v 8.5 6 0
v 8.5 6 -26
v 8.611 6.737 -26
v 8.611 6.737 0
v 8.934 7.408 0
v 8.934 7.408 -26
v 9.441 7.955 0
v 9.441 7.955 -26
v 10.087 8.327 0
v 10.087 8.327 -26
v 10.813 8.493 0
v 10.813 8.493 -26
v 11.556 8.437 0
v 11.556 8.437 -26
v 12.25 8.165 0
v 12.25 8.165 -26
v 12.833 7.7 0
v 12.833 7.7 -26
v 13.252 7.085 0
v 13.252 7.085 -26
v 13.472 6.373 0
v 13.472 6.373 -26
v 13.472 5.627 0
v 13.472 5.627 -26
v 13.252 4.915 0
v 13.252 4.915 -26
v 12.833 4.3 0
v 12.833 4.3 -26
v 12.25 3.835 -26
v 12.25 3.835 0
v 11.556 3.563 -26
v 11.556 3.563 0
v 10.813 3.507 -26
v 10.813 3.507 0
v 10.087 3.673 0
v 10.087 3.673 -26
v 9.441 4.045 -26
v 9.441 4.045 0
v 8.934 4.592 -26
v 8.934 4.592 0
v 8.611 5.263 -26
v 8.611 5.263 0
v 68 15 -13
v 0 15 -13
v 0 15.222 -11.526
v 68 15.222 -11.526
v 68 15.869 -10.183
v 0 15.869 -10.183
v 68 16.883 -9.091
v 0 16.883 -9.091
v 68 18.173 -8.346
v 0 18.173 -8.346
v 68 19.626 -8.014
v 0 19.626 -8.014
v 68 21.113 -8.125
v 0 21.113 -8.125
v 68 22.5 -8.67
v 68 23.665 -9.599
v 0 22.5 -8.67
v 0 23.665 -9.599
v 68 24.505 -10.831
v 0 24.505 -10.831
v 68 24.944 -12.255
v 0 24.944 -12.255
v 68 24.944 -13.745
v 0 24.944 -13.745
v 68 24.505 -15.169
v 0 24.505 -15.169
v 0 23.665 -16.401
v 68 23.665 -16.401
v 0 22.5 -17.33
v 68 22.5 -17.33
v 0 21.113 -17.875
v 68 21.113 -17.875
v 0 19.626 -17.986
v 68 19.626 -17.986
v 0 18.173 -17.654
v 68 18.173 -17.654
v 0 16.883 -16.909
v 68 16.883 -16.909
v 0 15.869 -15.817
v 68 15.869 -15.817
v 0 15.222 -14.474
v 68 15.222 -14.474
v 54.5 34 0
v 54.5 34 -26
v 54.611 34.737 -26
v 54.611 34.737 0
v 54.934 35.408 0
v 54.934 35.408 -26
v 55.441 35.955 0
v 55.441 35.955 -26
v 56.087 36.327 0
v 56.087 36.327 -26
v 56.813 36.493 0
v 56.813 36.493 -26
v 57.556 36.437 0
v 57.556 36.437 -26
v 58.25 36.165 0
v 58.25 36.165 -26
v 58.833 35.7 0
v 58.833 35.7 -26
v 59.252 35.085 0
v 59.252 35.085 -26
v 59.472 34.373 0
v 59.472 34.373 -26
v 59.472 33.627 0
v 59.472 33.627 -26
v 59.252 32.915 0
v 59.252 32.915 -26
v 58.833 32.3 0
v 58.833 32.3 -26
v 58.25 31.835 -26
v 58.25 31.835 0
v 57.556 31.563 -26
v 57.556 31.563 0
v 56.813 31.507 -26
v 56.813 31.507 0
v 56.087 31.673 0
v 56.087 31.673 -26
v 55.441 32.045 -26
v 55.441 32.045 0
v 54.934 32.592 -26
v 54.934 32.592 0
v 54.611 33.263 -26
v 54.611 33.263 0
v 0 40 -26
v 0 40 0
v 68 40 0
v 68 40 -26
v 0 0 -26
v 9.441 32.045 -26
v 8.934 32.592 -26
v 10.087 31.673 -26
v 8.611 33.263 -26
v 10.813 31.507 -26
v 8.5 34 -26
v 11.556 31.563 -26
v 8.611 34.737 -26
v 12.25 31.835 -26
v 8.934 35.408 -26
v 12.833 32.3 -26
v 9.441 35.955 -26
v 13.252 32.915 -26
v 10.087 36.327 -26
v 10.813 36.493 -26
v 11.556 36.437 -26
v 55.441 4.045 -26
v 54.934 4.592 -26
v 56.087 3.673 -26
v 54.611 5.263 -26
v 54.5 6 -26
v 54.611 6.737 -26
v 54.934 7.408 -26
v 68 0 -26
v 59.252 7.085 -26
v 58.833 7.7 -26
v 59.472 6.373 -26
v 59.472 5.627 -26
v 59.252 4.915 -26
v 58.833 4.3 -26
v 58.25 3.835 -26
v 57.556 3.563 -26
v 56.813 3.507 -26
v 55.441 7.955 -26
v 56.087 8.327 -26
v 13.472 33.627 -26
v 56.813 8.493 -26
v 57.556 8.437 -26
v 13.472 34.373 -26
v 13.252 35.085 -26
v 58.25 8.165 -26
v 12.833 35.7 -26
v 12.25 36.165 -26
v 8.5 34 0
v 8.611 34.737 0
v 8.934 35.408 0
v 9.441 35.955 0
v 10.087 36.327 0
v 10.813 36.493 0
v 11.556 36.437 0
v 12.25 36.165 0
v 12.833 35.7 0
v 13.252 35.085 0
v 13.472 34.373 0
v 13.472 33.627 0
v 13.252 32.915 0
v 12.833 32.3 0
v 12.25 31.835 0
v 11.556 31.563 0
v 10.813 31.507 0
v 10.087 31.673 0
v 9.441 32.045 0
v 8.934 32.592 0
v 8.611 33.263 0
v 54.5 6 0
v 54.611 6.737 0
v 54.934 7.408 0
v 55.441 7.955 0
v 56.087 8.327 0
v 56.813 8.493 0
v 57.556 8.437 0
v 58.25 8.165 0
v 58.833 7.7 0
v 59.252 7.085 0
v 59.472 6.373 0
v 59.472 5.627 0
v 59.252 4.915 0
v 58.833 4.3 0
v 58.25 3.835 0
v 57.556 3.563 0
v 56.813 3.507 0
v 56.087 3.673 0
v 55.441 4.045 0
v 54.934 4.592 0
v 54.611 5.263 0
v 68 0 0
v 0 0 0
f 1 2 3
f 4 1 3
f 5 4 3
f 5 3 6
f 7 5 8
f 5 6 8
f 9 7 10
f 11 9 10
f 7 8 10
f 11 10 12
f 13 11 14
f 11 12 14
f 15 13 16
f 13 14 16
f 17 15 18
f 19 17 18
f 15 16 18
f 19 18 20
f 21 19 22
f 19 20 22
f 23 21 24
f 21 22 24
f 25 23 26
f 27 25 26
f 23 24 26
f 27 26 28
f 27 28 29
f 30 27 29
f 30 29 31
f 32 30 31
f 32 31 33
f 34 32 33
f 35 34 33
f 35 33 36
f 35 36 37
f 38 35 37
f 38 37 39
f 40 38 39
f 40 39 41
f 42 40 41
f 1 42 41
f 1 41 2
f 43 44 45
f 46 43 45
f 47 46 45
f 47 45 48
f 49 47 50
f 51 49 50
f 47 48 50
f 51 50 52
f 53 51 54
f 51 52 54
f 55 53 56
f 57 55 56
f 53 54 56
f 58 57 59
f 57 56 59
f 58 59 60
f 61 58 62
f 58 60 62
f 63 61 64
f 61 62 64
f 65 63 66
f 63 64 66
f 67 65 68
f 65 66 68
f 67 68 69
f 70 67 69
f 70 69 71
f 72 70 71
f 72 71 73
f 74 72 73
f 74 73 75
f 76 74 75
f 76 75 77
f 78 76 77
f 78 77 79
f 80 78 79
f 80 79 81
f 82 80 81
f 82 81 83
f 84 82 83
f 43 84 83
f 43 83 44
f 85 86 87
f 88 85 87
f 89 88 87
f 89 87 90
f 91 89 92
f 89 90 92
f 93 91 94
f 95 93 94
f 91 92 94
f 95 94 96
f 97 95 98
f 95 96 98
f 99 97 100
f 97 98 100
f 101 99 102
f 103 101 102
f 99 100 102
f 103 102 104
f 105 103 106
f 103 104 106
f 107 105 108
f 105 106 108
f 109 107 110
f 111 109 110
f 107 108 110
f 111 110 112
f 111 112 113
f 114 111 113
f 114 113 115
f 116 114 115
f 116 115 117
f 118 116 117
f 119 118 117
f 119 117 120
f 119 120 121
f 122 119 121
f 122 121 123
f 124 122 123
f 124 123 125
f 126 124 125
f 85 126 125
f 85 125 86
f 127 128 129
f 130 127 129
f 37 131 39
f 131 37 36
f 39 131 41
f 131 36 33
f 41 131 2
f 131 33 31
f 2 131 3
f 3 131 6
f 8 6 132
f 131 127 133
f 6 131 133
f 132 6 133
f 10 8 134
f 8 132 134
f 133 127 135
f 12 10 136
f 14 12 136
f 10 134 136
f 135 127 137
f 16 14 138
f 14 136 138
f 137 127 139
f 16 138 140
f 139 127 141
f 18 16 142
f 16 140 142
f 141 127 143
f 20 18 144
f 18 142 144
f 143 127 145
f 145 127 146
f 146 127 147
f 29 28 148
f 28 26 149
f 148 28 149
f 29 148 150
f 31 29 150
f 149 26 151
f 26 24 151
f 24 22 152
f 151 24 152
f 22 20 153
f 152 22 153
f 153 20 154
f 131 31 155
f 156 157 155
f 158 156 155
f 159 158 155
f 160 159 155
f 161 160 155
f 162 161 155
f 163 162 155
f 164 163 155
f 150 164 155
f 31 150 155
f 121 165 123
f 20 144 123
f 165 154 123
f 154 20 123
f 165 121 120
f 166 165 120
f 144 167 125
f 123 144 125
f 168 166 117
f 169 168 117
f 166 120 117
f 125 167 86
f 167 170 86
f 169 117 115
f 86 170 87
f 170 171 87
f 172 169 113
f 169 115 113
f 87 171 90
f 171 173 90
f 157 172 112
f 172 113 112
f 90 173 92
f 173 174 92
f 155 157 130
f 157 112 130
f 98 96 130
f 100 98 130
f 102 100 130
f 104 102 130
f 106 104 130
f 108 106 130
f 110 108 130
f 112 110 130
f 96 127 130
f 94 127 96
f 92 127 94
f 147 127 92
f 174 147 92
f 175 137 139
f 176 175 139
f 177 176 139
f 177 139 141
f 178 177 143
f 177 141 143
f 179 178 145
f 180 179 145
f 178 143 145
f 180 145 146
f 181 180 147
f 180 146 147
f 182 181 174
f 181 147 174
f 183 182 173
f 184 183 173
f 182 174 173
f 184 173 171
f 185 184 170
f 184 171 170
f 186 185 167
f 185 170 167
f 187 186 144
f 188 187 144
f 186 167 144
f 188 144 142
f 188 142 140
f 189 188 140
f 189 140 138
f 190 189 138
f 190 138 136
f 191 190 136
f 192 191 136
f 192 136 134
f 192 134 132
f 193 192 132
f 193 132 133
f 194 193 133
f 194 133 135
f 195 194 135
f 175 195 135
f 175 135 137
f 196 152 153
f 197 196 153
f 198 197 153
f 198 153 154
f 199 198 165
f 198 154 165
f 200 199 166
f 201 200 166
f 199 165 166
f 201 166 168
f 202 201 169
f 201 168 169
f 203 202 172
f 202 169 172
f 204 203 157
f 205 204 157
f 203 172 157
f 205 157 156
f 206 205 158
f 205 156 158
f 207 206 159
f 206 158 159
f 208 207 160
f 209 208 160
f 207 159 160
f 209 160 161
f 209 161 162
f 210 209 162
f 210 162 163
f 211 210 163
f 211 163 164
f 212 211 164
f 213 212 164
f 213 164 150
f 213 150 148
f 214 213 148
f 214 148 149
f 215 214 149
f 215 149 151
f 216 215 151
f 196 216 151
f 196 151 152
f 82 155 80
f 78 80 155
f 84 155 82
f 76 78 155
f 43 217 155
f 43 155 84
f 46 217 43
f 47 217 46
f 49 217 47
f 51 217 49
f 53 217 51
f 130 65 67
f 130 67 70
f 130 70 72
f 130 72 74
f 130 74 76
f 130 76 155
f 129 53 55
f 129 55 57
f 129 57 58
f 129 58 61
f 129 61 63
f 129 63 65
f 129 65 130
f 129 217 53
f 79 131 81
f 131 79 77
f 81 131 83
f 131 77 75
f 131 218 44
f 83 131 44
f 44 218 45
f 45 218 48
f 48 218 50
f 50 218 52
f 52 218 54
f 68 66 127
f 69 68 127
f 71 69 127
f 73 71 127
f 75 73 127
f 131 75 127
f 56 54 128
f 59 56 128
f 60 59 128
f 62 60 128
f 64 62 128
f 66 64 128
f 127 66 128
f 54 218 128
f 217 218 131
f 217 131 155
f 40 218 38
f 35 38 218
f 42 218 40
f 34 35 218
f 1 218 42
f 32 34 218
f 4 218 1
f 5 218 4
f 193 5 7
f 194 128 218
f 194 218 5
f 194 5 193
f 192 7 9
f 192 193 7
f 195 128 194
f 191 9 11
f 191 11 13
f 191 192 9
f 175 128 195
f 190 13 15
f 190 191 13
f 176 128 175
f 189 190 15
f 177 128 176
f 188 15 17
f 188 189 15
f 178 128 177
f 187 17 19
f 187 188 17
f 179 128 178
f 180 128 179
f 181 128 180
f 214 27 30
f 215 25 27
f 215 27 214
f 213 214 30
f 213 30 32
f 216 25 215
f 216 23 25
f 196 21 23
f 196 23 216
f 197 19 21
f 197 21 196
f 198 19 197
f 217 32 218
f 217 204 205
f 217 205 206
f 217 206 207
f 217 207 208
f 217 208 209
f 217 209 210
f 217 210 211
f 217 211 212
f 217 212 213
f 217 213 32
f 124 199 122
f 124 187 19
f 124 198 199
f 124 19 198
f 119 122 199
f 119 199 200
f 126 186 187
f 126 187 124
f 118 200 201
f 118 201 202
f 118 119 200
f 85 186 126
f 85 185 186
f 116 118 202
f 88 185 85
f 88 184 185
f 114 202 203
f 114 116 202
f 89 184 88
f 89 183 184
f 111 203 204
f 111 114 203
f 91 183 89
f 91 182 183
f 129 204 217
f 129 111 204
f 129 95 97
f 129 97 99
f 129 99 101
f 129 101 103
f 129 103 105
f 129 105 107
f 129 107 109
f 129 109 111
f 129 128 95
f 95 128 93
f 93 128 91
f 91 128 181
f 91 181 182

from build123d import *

# Parameters (mm, degrees)
SCHIZZO1_W                   = 68
SCHIZZO1_H                   = 40
ESTRUSIONE_ESTRUSIONE1_DEPTH = 26
SCHIZZO2_R                   = 5
TAGLIO_ESTRUSIONE1_DEPTH     = 84.066238629
SCHIZZO3_R                   = 2.5
TAGLIO_ESTRUSIONE2_DEPTH     = 84.066238629


with BuildPart() as part:
    # Schizzo1 → Estrusione-Estrusione1 (new body)
    with BuildSketch(Plane.XY):
        with Locations((34, 20)):
            Rectangle(SCHIZZO1_W, SCHIZZO1_H)
    extrude(amount=-ESTRUSIONE_ESTRUSIONE1_DEPTH)

    # Schizzo2 → Taglio-Estrusione1 (cut, through all)
    with BuildSketch(Plane.ZY):
        with Locations(Location((-13, 20, 0), (0, 0, 270))):
            Circle(SCHIZZO2_R)
    extrude(amount=-TAGLIO_ESTRUSIONE1_DEPTH, mode=Mode.SUBTRACT)

    # Schizzo3 → Taglio-Estrusione2 (cut, through all)
    with BuildSketch(Plane(origin=(0, 0, -26), x_dir=(-1, 0, 0), z_dir=(0, 0, -1))):
        with Locations((-11, 34)):
            Circle(SCHIZZO3_R)
        with Locations((-57, 34)):
            Circle(SCHIZZO3_R)
        with Locations((-57, 6)):
            Circle(SCHIZZO3_R)
        with Locations((-11, 6)):
            Circle(SCHIZZO3_R)
    extrude(amount=-TAGLIO_ESTRUSIONE2_DEPTH, mode=Mode.SUBTRACT)


solid = part.part
